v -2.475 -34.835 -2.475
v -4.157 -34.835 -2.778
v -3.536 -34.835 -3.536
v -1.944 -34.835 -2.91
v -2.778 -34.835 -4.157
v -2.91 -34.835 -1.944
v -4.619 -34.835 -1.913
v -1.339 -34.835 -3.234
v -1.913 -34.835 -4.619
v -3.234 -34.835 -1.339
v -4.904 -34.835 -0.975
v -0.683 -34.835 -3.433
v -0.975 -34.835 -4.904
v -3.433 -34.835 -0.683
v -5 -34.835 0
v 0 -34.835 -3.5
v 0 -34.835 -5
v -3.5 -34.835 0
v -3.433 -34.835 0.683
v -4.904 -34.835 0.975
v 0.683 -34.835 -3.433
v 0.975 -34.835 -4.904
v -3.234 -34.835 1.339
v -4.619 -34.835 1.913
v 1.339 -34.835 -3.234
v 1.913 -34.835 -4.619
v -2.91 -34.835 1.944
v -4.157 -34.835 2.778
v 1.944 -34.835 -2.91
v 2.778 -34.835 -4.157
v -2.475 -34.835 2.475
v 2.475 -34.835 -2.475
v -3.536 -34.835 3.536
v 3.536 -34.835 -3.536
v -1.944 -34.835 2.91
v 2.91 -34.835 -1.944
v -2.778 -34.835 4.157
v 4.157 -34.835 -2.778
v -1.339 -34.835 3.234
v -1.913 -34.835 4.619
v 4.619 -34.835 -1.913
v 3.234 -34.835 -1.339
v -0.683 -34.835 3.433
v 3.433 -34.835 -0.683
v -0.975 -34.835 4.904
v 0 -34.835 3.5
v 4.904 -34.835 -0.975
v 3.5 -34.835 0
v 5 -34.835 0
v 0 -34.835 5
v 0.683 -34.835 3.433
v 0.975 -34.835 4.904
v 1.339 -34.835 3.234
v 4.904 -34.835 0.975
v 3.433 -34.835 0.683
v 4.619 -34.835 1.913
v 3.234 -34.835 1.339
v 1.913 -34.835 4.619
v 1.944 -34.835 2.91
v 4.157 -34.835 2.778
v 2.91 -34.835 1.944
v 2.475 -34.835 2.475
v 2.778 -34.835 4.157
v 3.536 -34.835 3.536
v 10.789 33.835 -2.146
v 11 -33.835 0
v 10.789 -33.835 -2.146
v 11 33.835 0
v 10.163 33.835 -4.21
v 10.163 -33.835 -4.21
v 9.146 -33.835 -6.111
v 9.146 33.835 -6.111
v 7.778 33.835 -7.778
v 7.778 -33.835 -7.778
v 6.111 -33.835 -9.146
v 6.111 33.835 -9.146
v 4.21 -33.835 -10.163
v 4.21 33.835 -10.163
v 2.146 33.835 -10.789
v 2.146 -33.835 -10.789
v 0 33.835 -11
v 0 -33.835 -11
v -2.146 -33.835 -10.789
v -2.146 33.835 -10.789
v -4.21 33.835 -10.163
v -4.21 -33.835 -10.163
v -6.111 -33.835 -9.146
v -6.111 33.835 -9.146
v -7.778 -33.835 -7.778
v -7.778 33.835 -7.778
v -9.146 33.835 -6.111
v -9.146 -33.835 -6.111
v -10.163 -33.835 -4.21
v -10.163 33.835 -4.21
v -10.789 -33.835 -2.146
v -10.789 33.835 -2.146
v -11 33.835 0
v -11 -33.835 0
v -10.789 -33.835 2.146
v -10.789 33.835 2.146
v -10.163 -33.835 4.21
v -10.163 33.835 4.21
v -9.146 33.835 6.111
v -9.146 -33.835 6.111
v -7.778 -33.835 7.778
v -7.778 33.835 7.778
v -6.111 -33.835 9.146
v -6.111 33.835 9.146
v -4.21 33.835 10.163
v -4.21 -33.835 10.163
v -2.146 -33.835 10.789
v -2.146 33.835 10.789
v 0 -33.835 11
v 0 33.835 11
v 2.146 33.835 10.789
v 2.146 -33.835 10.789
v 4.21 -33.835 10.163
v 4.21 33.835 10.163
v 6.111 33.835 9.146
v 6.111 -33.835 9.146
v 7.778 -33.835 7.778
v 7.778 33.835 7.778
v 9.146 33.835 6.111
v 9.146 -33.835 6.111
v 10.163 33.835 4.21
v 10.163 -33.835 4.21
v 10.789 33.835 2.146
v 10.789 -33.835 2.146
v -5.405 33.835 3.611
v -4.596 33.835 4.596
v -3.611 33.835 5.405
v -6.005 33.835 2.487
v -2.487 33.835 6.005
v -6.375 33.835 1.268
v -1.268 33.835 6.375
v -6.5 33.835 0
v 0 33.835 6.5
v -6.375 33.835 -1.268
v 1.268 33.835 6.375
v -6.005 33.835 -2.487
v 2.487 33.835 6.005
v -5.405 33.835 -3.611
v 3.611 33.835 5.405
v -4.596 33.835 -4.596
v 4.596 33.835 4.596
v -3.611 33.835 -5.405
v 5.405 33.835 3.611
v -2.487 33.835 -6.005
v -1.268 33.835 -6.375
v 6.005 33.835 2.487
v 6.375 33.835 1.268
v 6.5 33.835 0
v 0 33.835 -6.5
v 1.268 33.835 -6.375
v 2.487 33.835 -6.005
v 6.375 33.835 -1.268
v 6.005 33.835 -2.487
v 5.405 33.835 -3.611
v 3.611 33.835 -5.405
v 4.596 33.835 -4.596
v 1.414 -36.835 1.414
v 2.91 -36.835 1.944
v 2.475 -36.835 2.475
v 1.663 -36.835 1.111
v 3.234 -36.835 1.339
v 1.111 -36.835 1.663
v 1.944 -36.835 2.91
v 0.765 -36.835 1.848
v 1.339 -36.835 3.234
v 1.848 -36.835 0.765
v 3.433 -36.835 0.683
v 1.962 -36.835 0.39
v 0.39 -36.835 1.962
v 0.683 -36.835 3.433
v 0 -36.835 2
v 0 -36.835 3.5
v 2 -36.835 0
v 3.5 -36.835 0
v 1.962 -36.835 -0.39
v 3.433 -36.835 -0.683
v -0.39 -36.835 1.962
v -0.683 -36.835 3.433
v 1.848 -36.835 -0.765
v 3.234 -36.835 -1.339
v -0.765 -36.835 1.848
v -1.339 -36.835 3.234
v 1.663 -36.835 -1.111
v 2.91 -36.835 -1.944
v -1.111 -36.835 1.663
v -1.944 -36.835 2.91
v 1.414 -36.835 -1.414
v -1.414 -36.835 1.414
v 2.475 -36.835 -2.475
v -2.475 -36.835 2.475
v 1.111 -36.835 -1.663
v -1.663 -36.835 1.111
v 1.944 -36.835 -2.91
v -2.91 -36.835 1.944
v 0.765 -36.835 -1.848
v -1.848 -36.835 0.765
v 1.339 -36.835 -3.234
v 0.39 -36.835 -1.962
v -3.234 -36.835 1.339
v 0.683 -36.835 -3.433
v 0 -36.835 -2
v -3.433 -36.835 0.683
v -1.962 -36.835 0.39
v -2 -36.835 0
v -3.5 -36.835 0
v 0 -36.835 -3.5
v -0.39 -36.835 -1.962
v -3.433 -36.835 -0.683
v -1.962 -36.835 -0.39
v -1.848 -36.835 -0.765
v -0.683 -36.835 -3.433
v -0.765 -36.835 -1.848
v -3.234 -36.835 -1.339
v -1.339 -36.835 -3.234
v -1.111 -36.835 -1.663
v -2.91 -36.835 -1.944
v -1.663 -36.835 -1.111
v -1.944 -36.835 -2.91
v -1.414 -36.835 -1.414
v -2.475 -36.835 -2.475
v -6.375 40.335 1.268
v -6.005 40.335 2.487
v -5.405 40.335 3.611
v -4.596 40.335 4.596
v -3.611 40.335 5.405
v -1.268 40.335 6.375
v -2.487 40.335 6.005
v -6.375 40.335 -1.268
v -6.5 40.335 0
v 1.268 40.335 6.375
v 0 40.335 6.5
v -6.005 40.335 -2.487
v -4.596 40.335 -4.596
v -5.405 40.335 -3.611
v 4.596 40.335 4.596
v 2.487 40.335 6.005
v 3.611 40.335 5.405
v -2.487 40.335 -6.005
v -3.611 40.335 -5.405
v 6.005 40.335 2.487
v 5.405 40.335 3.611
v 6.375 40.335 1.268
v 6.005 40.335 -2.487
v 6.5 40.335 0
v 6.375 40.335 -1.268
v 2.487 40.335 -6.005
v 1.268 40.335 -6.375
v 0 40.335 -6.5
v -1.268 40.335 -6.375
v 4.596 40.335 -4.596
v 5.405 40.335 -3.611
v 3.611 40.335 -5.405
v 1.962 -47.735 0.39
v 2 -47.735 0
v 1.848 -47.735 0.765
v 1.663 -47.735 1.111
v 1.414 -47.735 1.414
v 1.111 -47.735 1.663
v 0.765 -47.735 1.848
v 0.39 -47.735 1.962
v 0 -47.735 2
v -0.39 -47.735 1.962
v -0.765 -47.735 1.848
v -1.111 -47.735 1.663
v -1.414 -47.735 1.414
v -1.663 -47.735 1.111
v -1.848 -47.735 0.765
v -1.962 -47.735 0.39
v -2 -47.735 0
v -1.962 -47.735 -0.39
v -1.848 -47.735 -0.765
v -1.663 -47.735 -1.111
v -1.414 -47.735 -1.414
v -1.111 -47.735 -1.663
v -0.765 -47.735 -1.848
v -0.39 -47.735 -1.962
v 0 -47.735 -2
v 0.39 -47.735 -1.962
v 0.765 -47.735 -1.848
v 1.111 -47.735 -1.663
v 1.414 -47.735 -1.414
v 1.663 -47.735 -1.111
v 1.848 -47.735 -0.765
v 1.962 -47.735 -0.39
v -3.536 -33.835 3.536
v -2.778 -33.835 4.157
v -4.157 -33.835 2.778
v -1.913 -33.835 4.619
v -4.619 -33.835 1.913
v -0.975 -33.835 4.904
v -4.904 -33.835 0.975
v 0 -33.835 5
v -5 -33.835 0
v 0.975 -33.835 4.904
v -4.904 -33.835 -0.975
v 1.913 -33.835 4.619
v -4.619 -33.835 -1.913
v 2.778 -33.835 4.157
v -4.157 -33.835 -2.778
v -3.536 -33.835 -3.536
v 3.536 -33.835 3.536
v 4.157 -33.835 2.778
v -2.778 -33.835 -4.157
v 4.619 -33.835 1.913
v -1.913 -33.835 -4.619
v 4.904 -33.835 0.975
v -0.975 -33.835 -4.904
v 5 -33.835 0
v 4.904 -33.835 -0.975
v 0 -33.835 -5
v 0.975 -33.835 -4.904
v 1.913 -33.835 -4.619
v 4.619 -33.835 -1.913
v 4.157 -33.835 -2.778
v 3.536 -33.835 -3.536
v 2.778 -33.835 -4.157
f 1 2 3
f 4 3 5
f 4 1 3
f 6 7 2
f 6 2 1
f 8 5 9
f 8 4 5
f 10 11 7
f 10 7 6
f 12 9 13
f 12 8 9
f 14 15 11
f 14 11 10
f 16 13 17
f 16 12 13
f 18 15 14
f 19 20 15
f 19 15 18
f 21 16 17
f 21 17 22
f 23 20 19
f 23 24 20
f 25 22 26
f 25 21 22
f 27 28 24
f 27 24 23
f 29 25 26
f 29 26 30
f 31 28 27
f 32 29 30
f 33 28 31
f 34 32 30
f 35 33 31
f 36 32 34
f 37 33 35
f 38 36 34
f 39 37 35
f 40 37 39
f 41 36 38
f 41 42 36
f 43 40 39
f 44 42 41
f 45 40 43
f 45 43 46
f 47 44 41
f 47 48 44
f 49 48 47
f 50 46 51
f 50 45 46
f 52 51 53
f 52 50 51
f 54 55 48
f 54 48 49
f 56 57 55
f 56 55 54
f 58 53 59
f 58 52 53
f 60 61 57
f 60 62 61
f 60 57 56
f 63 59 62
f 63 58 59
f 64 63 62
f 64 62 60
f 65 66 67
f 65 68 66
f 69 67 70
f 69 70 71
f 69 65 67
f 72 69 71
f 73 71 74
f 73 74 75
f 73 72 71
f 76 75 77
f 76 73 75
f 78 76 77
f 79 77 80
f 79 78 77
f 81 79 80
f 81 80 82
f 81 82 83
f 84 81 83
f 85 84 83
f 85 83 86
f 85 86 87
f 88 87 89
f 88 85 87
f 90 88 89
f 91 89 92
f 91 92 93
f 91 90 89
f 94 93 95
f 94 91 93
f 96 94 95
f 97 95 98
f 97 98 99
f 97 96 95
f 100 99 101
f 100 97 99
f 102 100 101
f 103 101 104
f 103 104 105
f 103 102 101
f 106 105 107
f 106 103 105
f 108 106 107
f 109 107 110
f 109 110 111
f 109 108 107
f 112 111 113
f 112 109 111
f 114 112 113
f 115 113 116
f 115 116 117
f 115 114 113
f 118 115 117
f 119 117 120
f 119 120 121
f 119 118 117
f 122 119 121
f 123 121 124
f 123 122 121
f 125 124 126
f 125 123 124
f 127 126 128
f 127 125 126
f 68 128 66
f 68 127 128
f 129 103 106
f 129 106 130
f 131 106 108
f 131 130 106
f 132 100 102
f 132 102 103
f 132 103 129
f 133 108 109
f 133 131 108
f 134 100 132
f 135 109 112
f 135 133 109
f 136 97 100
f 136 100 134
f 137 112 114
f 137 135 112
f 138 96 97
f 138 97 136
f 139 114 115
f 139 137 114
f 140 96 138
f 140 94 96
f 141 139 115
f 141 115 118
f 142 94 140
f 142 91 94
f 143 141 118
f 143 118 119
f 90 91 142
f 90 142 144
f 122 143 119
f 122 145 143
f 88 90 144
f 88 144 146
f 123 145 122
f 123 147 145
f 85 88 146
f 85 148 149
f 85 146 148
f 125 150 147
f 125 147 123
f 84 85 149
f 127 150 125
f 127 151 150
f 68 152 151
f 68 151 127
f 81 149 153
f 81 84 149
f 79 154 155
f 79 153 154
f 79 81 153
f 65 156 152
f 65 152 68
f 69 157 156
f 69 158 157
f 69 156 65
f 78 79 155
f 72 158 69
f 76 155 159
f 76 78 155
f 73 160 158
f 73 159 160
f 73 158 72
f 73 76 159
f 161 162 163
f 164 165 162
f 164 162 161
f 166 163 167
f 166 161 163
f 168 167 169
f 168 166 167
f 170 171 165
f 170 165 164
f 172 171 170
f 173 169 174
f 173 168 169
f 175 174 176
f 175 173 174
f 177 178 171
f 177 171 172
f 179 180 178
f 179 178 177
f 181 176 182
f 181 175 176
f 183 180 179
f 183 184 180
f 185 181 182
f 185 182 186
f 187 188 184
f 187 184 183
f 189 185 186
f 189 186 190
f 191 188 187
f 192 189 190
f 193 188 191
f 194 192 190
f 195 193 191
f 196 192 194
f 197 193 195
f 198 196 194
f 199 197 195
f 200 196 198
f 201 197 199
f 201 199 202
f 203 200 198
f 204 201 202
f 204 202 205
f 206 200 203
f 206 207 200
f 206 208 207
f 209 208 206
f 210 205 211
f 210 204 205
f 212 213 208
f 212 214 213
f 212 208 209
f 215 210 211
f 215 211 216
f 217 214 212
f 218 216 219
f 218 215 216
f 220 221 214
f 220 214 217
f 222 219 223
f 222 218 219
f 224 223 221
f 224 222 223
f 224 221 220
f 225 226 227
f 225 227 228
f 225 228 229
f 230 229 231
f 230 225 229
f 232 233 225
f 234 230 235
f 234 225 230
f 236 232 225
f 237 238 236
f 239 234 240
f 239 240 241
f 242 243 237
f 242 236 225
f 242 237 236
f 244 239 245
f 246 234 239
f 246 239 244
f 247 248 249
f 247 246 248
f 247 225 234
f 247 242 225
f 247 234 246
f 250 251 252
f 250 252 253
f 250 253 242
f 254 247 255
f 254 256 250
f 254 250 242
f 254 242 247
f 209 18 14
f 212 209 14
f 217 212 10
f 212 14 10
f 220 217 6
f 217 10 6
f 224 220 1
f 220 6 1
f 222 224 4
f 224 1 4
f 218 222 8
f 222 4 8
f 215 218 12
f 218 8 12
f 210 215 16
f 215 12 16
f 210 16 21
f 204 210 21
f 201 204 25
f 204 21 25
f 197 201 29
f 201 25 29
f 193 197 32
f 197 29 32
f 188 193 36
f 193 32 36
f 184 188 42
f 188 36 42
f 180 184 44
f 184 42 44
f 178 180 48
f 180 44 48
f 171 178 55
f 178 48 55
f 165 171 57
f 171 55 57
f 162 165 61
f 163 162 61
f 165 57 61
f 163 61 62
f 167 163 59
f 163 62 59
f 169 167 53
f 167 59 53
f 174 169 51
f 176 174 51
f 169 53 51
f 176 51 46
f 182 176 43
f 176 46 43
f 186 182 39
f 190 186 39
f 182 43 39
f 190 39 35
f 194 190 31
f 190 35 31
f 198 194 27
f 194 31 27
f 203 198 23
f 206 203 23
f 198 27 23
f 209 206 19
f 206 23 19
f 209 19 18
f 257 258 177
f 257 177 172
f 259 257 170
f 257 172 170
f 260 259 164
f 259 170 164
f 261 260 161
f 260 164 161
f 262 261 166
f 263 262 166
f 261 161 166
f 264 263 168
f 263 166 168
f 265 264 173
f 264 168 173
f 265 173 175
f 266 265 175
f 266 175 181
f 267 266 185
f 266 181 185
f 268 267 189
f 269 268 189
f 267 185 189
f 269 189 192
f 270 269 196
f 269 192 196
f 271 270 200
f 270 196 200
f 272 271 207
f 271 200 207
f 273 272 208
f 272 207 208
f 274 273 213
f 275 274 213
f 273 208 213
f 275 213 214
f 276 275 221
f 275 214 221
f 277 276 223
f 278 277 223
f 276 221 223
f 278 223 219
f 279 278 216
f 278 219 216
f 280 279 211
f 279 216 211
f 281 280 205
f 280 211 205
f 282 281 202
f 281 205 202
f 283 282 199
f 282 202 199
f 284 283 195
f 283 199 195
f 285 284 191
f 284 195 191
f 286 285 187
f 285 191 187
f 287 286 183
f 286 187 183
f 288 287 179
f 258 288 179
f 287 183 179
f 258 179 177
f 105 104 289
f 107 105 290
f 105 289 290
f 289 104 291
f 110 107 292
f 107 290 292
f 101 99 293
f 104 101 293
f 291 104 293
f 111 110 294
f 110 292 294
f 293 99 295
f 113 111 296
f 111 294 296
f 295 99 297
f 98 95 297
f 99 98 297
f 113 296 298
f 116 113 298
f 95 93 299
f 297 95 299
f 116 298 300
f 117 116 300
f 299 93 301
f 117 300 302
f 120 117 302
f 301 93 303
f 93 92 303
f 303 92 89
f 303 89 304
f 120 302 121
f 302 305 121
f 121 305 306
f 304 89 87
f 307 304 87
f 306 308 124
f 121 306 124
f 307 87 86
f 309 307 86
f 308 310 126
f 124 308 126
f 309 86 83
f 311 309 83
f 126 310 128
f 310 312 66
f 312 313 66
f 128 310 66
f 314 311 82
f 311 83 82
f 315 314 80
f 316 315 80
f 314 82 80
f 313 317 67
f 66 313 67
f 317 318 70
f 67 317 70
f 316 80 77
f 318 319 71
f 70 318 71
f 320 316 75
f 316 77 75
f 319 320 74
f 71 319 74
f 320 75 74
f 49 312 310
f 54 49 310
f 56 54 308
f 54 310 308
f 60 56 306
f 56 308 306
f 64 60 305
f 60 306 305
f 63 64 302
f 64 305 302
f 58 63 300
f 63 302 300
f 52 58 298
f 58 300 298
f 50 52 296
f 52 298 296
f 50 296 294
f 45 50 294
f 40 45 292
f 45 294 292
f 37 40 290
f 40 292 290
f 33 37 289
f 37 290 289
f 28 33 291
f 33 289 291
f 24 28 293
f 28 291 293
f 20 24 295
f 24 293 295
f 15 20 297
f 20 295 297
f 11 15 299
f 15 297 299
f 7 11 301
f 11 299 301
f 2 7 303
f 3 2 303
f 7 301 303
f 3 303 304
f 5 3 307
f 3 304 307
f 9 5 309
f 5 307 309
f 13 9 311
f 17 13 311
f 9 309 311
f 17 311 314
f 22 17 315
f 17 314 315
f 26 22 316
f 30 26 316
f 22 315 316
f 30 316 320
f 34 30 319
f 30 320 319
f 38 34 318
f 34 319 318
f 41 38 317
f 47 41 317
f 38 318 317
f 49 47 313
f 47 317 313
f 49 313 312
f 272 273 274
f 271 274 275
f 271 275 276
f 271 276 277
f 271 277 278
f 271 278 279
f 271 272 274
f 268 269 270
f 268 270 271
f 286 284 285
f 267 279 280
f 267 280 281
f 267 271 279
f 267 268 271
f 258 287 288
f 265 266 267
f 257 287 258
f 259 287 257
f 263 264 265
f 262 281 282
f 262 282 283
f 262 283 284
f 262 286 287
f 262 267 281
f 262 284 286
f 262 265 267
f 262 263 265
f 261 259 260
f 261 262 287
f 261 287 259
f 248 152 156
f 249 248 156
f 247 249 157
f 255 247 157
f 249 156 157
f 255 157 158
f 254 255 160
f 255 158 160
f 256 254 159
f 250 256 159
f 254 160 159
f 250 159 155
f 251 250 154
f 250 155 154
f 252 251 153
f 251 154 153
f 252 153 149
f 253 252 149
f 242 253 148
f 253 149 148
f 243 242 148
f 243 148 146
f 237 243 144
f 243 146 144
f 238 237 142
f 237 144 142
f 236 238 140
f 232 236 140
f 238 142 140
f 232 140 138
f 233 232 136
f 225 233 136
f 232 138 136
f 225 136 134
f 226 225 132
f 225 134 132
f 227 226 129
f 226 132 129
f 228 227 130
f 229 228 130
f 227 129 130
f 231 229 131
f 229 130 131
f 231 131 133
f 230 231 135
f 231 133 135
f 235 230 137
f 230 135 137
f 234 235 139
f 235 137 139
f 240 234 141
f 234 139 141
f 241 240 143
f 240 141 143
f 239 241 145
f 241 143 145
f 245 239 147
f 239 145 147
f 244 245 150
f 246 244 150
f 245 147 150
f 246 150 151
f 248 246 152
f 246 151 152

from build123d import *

# Parameters (mm, degrees)
SKETCH1_R           = 11
BOSS_EXTRUDE1_DEPTH = 33.835
SKETCH2_R           = 6.5
BOSS_EXTRUDE2_DEPTH = 6.5
SKETCH3_R           = 5
BOSS_EXTRUDE3_DEPTH = 1
SKETCH4_R           = 3.5
BOSS_EXTRUDE4_DEPTH = 2
SKETCH5_R           = 2
BOSS_EXTRUDE5_DEPTH = 10.9


with BuildPart() as part:
    # Sketch1 → Boss-Extrude1 (new body, symmetric)
    with BuildSketch(Plane(origin=(0, 0, 0), x_dir=(1, 0, 0), z_dir=(0, 1, 0))):
        Circle(SKETCH1_R)
    extrude(amount=BOSS_EXTRUDE1_DEPTH, both=True)

    # Sketch2 → Boss-Extrude2 (add)
    with BuildSketch(Plane(origin=(0, 33.835, 0), x_dir=(1, 0, 0), z_dir=(0, 1, 0))):
        Circle(SKETCH2_R)
    extrude(amount=BOSS_EXTRUDE2_DEPTH)

    # Sketch3 → Boss-Extrude3 (add)
    with BuildSketch(Plane.XZ.offset(33.835)):
        Circle(SKETCH3_R)
    extrude(amount=BOSS_EXTRUDE3_DEPTH)

    # Sketch4 → Boss-Extrude4 (add)
    with BuildSketch(Plane(origin=(0, -34.835, 0), x_dir=(-1, 0, 0), z_dir=(0, -1, 0))):
        Circle(SKETCH4_R)
    extrude(amount=BOSS_EXTRUDE4_DEPTH)

    # Sketch5 → Boss-Extrude5 (add)
    with BuildSketch(Plane.XZ.offset(36.835)):
        Circle(SKETCH5_R)
    extrude(amount=BOSS_EXTRUDE5_DEPTH)


solid = part.part
